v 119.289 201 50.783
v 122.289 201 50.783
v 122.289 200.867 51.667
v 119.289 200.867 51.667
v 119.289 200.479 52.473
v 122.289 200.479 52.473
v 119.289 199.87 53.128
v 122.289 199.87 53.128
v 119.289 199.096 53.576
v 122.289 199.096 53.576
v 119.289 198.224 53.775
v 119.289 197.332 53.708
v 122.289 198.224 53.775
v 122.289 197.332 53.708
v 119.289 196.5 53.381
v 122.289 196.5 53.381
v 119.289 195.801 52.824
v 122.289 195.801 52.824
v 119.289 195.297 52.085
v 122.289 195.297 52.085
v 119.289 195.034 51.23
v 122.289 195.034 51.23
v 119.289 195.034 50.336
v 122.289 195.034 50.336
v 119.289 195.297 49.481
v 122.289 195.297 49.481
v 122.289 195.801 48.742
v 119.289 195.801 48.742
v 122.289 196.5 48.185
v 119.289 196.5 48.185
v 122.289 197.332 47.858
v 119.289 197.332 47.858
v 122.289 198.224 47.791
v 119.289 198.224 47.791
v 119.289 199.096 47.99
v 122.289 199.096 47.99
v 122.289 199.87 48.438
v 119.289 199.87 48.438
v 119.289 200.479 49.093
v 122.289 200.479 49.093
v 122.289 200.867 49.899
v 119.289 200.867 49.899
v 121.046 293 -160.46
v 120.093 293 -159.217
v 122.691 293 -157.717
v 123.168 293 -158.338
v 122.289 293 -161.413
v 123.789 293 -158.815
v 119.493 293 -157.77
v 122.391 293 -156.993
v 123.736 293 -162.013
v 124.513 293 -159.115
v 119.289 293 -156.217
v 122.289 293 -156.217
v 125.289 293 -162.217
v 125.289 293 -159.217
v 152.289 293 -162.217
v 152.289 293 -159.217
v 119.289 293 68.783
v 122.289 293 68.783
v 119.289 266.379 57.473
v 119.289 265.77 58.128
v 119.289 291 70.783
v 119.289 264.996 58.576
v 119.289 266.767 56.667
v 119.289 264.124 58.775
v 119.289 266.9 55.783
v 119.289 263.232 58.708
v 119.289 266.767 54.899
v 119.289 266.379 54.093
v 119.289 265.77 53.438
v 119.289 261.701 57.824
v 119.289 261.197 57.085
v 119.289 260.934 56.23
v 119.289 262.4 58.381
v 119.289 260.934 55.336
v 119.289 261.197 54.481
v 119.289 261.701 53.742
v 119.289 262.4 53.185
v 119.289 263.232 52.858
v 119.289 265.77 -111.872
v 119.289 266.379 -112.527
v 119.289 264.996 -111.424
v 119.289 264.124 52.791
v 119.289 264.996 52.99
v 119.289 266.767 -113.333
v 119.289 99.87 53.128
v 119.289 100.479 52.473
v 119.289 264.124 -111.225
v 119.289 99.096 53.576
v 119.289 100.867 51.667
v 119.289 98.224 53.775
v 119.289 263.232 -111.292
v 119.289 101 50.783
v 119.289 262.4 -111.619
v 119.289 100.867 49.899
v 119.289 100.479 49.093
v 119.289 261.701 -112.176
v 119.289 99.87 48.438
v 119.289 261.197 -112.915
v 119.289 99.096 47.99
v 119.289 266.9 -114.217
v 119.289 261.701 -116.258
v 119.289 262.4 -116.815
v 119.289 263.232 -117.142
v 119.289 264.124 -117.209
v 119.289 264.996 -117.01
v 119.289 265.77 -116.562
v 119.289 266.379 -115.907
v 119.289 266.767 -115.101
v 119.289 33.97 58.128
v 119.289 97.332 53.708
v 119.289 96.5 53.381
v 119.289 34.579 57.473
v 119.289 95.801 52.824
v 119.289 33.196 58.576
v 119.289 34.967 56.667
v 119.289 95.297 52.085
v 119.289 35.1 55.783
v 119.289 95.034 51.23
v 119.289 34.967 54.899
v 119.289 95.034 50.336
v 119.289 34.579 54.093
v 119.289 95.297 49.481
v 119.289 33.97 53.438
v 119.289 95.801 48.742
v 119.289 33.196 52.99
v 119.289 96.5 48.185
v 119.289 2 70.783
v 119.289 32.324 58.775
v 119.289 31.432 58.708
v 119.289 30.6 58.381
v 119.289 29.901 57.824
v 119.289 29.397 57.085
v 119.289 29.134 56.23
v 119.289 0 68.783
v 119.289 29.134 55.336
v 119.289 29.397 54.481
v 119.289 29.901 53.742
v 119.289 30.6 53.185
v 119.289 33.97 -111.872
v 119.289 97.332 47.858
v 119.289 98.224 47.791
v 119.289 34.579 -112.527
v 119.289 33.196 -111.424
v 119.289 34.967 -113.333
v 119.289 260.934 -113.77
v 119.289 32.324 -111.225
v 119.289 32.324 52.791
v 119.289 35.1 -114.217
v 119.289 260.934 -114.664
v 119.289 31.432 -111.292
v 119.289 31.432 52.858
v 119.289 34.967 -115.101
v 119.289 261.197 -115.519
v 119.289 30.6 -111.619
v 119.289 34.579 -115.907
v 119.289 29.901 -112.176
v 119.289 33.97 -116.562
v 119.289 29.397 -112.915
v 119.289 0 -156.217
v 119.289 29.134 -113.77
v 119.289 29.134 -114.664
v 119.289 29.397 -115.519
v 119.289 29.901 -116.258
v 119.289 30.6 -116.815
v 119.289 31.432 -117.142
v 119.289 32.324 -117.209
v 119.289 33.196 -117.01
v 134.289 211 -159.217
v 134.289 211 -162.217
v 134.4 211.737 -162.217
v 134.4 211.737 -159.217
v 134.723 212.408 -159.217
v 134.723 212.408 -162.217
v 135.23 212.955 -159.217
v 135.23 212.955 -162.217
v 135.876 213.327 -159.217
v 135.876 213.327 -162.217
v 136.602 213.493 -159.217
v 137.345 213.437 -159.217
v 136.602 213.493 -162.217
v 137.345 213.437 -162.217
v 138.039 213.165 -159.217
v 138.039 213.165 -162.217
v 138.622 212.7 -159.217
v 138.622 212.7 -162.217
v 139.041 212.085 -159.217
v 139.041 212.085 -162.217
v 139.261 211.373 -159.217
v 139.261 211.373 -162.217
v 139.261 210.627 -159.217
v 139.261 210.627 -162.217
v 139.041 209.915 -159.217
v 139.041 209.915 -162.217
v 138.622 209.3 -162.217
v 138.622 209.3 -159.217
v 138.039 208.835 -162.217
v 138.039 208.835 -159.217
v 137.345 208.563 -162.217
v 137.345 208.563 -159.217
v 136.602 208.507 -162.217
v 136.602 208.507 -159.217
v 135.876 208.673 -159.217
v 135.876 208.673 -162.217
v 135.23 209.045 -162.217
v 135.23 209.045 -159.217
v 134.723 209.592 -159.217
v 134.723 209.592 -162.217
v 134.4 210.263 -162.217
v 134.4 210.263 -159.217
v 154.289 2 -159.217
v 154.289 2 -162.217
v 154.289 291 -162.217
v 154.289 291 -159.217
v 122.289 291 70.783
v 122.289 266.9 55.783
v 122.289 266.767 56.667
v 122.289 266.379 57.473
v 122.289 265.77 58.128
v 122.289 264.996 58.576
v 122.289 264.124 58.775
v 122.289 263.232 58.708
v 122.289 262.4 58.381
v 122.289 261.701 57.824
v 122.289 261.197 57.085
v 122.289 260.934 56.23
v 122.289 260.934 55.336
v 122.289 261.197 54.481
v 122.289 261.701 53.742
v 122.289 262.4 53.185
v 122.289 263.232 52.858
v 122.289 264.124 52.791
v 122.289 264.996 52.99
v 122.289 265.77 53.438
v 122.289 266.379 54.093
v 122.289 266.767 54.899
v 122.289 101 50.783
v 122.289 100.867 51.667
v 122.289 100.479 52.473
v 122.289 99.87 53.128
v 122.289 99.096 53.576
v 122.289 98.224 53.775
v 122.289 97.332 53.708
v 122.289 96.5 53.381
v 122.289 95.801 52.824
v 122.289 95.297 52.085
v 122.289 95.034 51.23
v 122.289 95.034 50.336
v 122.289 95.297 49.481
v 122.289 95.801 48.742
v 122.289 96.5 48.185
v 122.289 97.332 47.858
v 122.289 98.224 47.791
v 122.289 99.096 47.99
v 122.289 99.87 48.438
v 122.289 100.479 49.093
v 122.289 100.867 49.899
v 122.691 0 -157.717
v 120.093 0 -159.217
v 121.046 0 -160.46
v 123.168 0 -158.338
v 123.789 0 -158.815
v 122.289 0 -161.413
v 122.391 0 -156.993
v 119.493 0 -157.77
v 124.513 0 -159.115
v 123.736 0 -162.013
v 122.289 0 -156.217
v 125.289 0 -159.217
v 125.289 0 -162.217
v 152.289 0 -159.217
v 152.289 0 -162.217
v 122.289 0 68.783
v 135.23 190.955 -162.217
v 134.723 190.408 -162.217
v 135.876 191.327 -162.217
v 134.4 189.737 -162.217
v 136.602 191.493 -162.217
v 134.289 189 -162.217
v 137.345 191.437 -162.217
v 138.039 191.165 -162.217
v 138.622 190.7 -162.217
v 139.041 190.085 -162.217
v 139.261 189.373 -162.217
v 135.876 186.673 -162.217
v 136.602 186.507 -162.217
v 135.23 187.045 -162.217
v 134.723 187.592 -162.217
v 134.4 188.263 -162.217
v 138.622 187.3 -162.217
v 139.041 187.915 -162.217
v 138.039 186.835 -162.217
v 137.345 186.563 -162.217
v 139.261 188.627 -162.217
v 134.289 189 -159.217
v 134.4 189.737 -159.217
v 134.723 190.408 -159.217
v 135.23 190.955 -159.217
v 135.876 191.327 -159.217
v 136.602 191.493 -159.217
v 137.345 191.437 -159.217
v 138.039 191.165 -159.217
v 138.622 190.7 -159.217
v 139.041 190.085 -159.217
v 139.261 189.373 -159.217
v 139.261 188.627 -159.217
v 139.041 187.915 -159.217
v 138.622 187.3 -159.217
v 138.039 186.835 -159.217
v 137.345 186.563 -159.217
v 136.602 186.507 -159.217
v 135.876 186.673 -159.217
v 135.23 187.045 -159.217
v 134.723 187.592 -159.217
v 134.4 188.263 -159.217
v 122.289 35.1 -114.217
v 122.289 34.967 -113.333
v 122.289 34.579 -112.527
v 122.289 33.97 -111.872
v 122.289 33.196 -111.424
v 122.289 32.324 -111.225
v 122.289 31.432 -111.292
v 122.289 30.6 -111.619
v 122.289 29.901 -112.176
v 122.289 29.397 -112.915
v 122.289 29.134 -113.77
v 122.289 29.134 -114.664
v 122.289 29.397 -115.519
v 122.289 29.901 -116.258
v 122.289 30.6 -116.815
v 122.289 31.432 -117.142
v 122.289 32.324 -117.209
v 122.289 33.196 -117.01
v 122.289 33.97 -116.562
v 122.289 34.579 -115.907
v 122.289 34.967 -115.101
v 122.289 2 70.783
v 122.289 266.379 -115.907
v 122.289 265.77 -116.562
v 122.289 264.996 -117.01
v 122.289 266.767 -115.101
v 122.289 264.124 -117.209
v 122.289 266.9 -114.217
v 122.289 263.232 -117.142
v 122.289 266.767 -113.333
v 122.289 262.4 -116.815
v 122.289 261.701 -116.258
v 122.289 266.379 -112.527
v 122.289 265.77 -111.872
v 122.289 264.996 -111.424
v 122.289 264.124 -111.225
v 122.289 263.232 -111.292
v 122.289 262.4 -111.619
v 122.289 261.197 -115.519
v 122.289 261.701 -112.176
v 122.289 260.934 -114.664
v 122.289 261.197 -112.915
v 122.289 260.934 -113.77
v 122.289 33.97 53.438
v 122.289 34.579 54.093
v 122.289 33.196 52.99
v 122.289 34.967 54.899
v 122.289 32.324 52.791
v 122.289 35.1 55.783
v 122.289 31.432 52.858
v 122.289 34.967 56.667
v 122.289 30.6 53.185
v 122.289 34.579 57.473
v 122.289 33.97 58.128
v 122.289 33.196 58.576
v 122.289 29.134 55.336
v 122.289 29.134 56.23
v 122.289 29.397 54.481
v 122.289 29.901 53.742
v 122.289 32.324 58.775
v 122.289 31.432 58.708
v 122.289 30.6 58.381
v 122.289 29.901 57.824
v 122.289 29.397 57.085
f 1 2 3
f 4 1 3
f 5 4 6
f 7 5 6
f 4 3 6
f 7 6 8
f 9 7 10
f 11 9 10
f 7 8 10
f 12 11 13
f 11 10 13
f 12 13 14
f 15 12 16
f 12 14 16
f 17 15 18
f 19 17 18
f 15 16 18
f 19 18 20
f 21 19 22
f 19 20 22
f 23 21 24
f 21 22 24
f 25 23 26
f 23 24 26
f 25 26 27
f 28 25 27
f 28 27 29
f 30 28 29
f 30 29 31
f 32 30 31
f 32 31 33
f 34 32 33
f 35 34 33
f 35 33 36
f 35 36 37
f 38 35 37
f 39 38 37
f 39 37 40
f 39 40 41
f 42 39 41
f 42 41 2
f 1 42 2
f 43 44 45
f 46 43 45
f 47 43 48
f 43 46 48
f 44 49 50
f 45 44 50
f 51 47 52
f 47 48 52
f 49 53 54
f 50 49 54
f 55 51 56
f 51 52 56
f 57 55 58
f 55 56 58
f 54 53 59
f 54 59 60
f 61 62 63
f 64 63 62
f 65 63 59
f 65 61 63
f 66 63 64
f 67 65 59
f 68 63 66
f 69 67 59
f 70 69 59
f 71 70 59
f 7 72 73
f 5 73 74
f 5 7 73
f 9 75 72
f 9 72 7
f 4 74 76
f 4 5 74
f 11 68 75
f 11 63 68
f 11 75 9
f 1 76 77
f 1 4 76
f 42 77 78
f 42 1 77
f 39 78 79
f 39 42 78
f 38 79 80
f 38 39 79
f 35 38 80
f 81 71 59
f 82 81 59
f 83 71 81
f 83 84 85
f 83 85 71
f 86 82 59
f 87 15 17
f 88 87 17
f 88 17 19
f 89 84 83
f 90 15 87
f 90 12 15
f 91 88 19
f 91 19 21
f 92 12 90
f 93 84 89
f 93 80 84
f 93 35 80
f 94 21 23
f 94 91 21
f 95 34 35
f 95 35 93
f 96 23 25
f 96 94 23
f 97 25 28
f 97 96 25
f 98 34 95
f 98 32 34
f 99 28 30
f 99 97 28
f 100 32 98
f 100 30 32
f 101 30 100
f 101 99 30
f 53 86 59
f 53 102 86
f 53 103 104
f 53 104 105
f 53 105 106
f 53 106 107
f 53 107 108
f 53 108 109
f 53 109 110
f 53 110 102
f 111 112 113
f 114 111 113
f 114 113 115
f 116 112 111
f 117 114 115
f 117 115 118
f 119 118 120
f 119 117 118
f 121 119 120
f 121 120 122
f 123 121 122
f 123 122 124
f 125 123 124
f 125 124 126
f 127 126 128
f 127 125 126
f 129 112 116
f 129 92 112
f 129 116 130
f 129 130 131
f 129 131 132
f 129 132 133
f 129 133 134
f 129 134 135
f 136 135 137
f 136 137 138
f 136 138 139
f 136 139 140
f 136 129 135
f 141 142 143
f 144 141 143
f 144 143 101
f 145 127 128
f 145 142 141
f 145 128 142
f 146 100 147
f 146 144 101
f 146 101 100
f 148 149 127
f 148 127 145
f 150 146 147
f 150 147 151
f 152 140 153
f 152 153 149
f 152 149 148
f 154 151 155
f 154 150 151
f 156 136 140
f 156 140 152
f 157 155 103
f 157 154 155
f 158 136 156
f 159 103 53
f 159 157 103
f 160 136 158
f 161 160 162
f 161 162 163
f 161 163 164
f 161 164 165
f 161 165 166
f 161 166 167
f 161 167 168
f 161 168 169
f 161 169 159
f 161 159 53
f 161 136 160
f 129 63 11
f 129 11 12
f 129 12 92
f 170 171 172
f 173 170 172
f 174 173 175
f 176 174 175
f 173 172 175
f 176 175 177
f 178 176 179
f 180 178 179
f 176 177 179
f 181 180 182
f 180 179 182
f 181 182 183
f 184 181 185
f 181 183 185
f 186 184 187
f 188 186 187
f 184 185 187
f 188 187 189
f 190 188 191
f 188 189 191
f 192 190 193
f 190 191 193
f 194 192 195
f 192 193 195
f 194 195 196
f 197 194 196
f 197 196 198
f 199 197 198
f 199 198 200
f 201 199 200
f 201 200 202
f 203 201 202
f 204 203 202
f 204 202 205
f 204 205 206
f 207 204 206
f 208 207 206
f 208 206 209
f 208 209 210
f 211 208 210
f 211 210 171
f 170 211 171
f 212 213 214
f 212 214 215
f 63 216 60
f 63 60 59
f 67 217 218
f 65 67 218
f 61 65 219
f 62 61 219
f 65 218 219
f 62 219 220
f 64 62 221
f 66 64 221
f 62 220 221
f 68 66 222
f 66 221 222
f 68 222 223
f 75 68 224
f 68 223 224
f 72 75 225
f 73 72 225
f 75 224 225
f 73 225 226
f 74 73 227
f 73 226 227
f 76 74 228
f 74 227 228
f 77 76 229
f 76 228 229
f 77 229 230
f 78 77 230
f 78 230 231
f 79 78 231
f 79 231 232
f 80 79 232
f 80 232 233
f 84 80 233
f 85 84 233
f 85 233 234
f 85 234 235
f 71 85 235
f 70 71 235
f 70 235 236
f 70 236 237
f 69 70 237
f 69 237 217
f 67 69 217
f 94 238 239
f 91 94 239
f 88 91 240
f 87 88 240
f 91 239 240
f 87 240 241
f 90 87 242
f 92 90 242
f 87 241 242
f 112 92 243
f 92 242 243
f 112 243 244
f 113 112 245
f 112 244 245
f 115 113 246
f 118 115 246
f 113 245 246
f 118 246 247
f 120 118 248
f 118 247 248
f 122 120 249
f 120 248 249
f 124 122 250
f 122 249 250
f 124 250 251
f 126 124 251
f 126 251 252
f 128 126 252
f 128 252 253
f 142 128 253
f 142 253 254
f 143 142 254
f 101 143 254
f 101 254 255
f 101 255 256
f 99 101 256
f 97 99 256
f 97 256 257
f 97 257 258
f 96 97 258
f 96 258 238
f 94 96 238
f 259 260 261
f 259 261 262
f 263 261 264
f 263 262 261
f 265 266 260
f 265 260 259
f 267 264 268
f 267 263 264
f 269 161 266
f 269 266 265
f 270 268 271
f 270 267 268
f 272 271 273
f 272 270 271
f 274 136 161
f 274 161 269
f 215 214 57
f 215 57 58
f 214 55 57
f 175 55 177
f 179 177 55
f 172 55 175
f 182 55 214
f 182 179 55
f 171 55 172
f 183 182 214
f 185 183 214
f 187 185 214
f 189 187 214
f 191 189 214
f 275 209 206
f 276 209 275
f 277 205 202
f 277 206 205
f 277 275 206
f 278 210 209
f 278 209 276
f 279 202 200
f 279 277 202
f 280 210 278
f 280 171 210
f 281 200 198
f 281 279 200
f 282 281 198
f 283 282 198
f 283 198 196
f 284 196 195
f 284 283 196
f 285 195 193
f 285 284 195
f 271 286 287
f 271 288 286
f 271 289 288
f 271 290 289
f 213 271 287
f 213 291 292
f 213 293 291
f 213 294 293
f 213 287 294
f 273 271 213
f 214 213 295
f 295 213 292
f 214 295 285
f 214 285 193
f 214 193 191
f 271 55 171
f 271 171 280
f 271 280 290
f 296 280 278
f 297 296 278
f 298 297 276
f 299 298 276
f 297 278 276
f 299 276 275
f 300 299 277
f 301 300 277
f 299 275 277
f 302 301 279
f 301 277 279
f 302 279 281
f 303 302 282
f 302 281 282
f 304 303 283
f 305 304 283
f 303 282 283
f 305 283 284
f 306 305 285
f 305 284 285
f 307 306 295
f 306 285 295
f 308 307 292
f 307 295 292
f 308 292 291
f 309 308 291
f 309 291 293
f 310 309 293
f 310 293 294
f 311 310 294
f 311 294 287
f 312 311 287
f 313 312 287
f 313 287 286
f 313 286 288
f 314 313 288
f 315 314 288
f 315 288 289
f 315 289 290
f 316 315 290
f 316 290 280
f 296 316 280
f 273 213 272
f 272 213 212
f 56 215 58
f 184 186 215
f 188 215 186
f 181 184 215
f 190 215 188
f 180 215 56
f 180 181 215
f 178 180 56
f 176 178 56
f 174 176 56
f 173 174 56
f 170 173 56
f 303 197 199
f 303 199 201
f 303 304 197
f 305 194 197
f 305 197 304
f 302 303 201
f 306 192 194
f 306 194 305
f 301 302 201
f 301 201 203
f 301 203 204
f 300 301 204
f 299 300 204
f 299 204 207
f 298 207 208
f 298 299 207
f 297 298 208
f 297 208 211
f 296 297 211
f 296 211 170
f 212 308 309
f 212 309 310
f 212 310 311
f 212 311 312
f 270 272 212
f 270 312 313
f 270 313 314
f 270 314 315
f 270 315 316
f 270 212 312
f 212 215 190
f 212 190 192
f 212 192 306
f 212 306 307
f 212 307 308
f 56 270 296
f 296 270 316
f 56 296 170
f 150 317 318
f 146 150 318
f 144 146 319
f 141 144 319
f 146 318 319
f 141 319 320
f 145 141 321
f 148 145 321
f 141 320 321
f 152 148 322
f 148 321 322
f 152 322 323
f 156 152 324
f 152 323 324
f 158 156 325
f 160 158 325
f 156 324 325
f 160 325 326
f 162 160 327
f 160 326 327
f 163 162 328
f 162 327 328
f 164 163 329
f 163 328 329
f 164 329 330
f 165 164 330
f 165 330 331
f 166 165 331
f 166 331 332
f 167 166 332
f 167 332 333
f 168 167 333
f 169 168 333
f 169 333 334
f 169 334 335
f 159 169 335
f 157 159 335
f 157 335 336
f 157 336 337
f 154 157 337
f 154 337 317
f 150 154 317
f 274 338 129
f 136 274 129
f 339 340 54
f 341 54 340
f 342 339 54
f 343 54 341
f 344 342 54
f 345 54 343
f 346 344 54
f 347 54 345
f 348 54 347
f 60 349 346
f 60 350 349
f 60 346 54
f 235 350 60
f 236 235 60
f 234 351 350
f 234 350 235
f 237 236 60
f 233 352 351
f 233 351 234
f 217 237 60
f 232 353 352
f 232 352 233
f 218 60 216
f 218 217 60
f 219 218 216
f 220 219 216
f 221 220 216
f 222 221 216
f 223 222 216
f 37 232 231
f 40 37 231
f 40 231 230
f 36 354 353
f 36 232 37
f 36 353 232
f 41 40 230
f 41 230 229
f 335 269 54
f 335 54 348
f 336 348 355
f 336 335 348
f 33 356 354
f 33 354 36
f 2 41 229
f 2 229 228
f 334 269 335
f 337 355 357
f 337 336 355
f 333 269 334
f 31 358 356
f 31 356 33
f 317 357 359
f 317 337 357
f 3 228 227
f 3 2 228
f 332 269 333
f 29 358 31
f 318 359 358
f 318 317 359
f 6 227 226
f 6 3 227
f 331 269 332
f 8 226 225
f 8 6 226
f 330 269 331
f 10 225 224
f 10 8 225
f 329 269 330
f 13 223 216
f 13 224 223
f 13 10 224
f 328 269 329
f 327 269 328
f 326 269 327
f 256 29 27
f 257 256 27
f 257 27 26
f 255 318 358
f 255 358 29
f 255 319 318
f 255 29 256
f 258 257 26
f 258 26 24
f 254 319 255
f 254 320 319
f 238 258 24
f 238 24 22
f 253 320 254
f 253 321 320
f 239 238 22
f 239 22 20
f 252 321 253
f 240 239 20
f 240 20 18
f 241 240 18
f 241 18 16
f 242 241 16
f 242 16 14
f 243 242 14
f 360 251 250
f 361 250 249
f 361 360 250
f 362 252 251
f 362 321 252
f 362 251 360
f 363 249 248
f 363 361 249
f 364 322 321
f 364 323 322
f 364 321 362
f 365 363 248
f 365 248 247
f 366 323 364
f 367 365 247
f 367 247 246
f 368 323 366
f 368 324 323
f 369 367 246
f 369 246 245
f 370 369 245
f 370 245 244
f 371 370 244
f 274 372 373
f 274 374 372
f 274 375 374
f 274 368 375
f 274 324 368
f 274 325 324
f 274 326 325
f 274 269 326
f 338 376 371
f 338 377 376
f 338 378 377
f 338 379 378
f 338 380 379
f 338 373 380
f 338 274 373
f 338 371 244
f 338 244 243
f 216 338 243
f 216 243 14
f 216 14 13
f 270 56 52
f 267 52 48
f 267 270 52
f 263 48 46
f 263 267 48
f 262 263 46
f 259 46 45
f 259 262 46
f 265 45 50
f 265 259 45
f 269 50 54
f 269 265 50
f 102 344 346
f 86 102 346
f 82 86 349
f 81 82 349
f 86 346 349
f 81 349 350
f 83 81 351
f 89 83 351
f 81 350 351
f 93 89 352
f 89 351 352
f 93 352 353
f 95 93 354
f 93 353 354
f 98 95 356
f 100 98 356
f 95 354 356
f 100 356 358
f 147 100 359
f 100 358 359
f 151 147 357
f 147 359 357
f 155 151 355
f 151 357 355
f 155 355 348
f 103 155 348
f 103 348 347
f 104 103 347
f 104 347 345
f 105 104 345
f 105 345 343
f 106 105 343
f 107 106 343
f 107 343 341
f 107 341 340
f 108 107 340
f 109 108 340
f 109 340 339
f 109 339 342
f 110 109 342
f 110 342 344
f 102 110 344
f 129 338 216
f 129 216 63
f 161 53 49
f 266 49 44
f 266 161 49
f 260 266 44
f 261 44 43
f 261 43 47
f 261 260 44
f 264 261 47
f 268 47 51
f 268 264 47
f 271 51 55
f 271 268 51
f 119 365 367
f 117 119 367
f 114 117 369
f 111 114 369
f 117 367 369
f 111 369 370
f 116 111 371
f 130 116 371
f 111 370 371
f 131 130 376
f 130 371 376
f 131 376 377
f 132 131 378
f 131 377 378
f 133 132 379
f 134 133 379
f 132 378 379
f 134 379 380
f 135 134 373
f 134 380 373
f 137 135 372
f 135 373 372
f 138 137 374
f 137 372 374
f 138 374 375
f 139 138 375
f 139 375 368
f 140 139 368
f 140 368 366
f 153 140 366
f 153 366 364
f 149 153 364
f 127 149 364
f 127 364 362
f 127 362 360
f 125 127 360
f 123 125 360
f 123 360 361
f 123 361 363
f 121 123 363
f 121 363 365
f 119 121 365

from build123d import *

# Parameters (mm, degrees)
F1_DEPTH = 293
F3_D     = 5
F5_D     = 6
F6_SIZE  = 2
F7_SIZE  = 2


with BuildPart() as f1:
    # F0 (on Front) → F1 (new body)
    with BuildSketch(Plane.XZ):
        with BuildLine():
            Line((122.288967, -156.216999), (122.288967, 70.783001))
            Line((122.288967, 70.783001), (119.288967, 70.783001))
            Line((119.288967, 70.783001), (119.288967, -156.216999))
            ThreePointArc((119.288967, -156.216999), (121.046326, -160.45964), (125.288967, -162.216999))
            Line((125.288967, -162.216999), (154.288967, -162.216999))
            Line((154.288967, -162.216999), (154.288967, -159.216999))
            Line((154.288967, -159.216999), (125.288967, -159.216999))
            ThreePointArc((125.288967, -159.216999), (123.167647, -158.338319), (122.288967, -156.216999))
        make_face()
    extrude(amount=-F1_DEPTH)

    # F3 (through all)
    with Locations(Plane.XY.offset(-159.216999)):
        with Locations((136.788967, 189), (136.788967, 211)):
            Hole(F3_D / 2)

    # F5 (through all)
    with Locations(Plane(origin=(119.288967, 0, 0), x_dir=(0, -1, 0), z_dir=(-1, 0, 0))):
        with Locations((-32.1, 55.783001), (-32.1, -114.216999), (-263.9, -114.216999), (-263.9, 55.783001), (-98, 50.783001), (-198, 50.783001)):
            Hole(F5_D / 2)

    # F6
    f6_edges = [f1.edges().sort_by_distance(p)[0] for p in [
        (120.788967, 0, 70.783001),
        (120.788967, 293, 70.783001),
        (154.288967, 293, -160.716999),
    ]]
    chamfer(f6_edges, length=F6_SIZE)

    # F7
    f7_edges = [f1.edges().sort_by_distance(p)[0] for p in [
        (154.288967, 0, -160.716999),
    ]]
    chamfer(f7_edges, length=F7_SIZE)


solid = f1.part
